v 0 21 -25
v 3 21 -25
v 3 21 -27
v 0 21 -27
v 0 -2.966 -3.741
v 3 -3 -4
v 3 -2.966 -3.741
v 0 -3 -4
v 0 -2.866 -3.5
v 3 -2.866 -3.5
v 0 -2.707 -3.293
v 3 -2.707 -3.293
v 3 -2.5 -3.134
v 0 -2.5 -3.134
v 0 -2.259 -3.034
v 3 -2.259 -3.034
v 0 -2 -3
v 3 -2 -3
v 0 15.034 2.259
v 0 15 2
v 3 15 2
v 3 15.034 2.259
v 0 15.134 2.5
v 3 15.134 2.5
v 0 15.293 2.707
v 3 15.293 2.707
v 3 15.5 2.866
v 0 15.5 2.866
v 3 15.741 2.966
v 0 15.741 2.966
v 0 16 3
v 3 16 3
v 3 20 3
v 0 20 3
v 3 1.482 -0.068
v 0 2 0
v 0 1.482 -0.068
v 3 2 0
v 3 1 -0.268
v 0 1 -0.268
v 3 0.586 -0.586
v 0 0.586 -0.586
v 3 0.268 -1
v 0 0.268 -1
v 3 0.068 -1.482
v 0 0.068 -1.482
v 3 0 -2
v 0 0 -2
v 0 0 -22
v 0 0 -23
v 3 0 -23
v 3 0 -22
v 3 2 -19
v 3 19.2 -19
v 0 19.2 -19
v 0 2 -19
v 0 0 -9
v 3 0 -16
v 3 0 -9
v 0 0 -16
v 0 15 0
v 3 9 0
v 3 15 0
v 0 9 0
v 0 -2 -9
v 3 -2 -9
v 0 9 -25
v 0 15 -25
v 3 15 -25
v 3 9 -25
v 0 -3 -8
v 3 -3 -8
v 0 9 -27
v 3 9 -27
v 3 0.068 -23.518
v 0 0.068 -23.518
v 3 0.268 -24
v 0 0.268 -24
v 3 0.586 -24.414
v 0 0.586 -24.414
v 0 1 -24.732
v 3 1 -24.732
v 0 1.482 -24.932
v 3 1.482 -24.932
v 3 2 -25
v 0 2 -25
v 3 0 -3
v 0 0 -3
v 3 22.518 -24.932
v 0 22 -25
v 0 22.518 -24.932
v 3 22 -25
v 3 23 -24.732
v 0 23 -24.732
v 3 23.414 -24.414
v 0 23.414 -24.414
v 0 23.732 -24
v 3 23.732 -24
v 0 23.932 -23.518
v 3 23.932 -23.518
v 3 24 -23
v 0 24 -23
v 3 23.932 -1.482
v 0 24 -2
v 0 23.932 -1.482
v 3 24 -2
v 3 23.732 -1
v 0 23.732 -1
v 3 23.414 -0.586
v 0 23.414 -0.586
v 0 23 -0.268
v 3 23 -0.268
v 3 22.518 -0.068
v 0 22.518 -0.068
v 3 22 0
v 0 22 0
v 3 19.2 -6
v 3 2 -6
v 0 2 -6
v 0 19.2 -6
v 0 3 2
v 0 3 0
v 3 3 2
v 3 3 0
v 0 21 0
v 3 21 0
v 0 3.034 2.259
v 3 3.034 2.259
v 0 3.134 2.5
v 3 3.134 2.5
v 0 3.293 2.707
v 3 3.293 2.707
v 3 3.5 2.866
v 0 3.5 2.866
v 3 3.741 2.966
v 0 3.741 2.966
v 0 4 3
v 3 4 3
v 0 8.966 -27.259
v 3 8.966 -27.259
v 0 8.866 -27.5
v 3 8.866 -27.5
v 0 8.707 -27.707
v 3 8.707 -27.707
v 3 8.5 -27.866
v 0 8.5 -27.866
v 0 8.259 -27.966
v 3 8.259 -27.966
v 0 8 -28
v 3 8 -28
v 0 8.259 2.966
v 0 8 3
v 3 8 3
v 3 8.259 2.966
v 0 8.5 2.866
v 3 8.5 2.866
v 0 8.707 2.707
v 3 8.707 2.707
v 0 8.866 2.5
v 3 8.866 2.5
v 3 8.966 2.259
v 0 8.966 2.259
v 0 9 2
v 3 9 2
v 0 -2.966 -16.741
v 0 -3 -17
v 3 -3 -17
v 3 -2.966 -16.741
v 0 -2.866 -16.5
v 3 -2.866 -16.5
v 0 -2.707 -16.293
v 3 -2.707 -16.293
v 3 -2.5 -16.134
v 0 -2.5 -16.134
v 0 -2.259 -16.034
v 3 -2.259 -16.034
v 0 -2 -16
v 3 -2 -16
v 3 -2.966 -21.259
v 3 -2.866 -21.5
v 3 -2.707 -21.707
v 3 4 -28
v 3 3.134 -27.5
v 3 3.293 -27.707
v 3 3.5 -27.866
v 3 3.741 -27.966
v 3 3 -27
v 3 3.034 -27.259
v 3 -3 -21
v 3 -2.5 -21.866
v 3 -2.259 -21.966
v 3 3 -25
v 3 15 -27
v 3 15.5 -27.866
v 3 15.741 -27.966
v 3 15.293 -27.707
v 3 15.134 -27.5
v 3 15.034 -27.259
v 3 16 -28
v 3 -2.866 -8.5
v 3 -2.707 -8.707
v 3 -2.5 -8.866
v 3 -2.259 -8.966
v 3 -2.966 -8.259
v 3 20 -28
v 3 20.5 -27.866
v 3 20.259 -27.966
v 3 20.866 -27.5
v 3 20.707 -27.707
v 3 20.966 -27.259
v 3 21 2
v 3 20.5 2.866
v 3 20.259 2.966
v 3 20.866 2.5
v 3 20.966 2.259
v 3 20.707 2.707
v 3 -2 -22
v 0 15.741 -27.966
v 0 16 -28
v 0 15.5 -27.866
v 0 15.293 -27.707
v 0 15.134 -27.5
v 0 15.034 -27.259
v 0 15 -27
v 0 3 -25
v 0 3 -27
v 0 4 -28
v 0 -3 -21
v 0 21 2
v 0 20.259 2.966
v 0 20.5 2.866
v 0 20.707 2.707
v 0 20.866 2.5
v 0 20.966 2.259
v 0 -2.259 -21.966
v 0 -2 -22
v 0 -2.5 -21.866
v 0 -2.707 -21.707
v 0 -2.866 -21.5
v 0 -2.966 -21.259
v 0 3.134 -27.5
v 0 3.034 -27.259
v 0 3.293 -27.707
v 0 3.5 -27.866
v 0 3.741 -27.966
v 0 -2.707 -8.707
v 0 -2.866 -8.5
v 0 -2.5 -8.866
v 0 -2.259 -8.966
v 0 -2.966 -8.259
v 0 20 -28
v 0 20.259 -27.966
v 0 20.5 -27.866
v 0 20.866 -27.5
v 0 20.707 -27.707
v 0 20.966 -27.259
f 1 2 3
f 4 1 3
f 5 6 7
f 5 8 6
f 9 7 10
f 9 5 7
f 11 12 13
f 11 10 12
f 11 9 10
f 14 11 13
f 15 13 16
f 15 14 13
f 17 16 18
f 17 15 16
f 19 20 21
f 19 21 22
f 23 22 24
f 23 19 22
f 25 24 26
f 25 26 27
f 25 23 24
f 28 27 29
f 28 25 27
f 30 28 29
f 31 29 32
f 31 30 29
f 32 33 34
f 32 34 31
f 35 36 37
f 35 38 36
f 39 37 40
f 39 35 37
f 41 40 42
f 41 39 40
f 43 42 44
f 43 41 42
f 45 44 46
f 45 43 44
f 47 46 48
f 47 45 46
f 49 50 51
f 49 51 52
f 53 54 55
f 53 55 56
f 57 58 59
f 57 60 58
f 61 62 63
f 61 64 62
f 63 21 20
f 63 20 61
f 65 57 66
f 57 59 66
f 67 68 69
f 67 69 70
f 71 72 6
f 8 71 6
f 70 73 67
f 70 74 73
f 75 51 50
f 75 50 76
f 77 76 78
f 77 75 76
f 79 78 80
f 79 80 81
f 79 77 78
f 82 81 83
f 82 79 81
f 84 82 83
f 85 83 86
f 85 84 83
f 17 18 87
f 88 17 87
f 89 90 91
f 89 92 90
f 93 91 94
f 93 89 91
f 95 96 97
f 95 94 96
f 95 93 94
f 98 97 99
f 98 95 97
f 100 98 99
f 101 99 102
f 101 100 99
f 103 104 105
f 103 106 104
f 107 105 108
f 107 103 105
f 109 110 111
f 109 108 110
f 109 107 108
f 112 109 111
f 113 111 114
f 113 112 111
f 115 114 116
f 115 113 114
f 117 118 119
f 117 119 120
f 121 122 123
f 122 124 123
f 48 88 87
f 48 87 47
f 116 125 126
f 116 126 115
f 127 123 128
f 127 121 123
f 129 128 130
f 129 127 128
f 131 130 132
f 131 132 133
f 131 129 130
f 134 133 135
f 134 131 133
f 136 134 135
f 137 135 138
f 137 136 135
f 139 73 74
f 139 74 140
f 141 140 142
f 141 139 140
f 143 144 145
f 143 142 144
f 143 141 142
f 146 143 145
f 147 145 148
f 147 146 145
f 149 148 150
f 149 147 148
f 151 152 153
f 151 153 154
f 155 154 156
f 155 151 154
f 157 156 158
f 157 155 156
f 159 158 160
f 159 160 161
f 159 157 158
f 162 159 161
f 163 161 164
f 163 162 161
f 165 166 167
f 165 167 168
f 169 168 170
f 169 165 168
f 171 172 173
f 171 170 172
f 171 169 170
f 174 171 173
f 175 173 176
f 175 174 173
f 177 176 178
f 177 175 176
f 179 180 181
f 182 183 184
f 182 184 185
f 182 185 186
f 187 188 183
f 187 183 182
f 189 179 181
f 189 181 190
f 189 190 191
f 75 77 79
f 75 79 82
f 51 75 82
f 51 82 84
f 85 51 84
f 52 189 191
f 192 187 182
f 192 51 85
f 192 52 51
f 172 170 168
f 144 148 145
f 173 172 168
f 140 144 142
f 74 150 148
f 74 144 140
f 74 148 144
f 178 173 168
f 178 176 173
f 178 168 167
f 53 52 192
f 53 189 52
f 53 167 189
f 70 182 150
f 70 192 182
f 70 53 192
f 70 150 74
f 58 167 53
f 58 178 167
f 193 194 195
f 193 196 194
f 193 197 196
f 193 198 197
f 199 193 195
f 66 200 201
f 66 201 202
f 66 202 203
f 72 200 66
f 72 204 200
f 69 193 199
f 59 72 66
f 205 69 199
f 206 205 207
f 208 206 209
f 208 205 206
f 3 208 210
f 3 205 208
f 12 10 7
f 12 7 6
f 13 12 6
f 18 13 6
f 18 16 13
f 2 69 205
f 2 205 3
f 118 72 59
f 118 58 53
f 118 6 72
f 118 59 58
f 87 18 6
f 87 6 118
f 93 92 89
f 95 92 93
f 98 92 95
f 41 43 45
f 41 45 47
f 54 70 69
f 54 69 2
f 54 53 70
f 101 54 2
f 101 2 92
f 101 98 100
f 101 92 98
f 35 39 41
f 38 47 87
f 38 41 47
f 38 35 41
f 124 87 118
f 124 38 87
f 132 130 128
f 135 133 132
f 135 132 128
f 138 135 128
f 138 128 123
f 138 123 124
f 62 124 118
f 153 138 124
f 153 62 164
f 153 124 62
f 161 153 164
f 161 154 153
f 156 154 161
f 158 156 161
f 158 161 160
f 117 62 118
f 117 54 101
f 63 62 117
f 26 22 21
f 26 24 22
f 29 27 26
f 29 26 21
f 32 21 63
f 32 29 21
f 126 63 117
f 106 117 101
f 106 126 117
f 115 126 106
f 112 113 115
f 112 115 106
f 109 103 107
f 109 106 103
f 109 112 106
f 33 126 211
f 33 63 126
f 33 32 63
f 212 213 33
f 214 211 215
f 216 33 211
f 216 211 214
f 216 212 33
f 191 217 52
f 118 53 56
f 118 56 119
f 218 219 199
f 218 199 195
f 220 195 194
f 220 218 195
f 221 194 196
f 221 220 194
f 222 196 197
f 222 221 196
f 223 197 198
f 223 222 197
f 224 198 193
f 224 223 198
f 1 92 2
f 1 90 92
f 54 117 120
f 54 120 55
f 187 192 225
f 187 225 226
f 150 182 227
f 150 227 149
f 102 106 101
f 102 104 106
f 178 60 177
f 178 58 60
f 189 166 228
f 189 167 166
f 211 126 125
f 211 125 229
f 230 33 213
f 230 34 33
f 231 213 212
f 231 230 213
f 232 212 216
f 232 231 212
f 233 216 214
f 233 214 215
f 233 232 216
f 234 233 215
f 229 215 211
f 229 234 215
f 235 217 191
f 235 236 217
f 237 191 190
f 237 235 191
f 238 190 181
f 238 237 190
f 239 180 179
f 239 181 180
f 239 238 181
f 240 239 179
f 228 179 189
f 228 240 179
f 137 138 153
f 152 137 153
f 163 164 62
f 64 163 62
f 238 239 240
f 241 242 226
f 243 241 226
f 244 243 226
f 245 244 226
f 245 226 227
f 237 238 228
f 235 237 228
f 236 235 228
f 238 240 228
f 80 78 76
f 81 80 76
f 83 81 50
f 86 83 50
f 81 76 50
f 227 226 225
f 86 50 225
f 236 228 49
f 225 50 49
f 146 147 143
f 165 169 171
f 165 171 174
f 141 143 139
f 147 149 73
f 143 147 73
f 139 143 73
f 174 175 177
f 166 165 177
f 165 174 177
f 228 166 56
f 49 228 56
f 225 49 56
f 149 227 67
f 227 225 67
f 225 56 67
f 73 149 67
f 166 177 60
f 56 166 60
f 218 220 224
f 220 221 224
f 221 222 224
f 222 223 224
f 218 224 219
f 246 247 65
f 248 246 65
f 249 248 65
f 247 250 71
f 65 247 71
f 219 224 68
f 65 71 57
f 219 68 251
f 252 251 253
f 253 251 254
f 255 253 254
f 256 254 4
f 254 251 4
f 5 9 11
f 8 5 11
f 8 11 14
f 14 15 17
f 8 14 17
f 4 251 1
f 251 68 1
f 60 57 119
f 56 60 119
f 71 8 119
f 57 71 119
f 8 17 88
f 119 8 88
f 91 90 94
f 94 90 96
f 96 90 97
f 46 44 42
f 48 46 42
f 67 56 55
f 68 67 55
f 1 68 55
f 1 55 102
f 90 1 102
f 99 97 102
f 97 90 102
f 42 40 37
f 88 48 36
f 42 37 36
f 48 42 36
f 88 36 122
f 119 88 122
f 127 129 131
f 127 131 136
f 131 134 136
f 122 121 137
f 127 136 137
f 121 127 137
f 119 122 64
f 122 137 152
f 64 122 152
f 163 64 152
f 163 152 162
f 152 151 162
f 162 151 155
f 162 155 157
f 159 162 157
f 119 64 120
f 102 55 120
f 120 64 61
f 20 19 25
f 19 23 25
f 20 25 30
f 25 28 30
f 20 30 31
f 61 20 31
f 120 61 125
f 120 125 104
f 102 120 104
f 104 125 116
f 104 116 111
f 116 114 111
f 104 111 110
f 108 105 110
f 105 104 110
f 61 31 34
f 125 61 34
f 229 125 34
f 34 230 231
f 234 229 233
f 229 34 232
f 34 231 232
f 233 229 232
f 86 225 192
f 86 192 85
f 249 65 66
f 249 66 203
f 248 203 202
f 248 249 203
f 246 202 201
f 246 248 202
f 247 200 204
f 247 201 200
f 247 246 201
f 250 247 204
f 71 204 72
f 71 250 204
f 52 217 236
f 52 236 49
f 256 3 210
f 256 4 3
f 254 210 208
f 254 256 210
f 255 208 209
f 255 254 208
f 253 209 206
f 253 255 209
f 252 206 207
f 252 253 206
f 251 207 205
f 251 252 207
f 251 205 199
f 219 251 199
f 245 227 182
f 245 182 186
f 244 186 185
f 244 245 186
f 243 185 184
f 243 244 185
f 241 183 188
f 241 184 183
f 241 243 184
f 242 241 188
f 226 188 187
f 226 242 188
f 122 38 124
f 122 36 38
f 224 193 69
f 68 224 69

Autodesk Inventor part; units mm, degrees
ref_plane "YZ Plane" through (0, 0, 0) normal (1, 0, 0) x (0, 1, 0)
ref_plane "XZ Plane" through (0, 0, 0) normal (0, 1, 0) x (-1, 0, 0)
ref_plane "XY Plane" through (0, 0, 0) normal (0, 0, 1) x (1, 0, 0)
sketch "Sketch1" plane through (0, 0, 0) normal (1, 0, 0) x (0, 1, 0)
  line L0 (0, 0) -> (24, 0)
  line L1 (24, 0) -> (24, -25)
  line L2 (24, -25) -> (0, -25)
  line L3 (0, -25) -> (0, 0)
  dimension "d0" = 24
  dimension "d1" = 25
extrude "Front Plate" add sketch "Sketch1" along normal blind 3
sketch "Sketch2" plane through (3, 0, 0) normal (1, 0, 0) x (0, 0, -1)
  line L0 (0, 24) -> (0, 0) projected
  line L1 (0, 21) -> (-3, 21)
  line L2 (-3, 21) -> (-3, 15)
  line L3 (-3, 15) -> (0, 15)
  line L4 (0, 15) -> (0, 21)
  line L5 (25, 24) -> (0, 24) projected
  line L6 (12.5, -1.4018) -> (12.5, 28.9484)
  line L7 (29.0475, 12) -> (-9.9529, 12)
  line L8 (0, 3) -> (-3, 3)
  line L9 (-3, 3) -> (-3, 9)
  line L10 (-3, 9) -> (0, 9)
  line L11 (0, 9) -> (0, 3)
  line L12 (0, 0) -> (25, 0) projected
  line L13 (3, 0) -> (9, 0)
  line L14 (9, 0) -> (9, -3)
  line L15 (9, -3) -> (3, -3)
  line L16 (3, -3) -> (3, 0)
  line L17 (25, 21) -> (28, 21)
  line L18 (28, 21) -> (28, 15)
  line L19 (28, 15) -> (25, 15)
  line L20 (25, 15) -> (25, 21)
  line L21 (25, 3) -> (28, 3)
  line L22 (28, 3) -> (28, 9)
  line L23 (28, 9) -> (25, 9)
  line L24 (25, 9) -> (25, 3)
  line L25 (22, 0) -> (16, 0)
  line L26 (16, 0) -> (16, -3)
  line L27 (16, -3) -> (22, -3)
  line L28 (22, -3) -> (22, 0)
  point P0 (0, 9)
  point P1 (9, 0)
  point P2 (0, 15)
  dimension "d4" = 3
  dimension "d5" = 6
  dimension "d6" = 3
  dimension "d7" = 3
  dimension "d8" = 6
  dimension "d9" = 3
extrude "Pegs" add sketch "Sketch2" against normal blind 3 contours L12 L28 L27 L26 | L0 L3 L2 L1 | L0 L8 L9 L10 | L14 L15 L16 L12 | L17 L18 L19 L20 | L24 L23 L22 L21
sketch "Sketch3" plane through (3, 0, 0) normal (1, 0, 0) x (0, 0, -1)
  line L0 (6, 19.2) -> (19, 19.2)
  line L1 (19, 19.2) -> (19, 2)
  line L2 (19, 2) -> (6, 2)
  line L3 (6, 2) -> (6, 19.2)
  line L4 (25, 9) -> (25, 15) projected
  line L5 (0, 15) -> (0, 9) projected
  line L6 (25, 24) -> (0, 24) projected
  line L7 (9, 0) -> (16, 0) projected
  point P0 (0, 0)
  dimension "d12" = 6
  dimension "d13" = 6
  dimension "d14" = 4.8
  dimension "d15" = 2
extrude "Camera CutOut" cut sketch "Sketch3" against normal blind 3
fillet "PiCam Corner Radius" radius 2 4 edges at (1.5, 24, 0) (1.5, 24, -25) (1.5, 0, -25) (1.5, 0, 0)
fillet "Peg Fillet" radius 1 12 edges at (1.5, 21, 3) (1.5, 15, 3) (1.5, 9, 3) (1.5, 3, 3) (1.5, -3, -3) (1.5, -3, -9) (1.5, -3, -16) (1.5, -3, -22) (1.5, 3, -28) (1.5, 9, -28) (1.5, 15, -28) (1.5, 21, -28)
equation "\"d0\" = CameraHeight"
equation "\"d1\" = CameraWidth"
equation "\"d2\" = Acrylic"
equation "\"d4\" = Acrylic"
equation "\"d5\" = 0.25 * CameraHeight"
equation "\"d7\" = Acrylic"
equation "\"d8\" = d5"
equation "\"d9\" = d6"
equation "\"d10\" = Acrylic"
equation "\"d13\" = d12"
equation "\"d16\" = Acrylic"
equation "\"CameraHeight\" = 24"
equation "\"CameraWidth\" = 25"
equation "\"Acrylic\" = 3"
properties part number "FacePlate"
